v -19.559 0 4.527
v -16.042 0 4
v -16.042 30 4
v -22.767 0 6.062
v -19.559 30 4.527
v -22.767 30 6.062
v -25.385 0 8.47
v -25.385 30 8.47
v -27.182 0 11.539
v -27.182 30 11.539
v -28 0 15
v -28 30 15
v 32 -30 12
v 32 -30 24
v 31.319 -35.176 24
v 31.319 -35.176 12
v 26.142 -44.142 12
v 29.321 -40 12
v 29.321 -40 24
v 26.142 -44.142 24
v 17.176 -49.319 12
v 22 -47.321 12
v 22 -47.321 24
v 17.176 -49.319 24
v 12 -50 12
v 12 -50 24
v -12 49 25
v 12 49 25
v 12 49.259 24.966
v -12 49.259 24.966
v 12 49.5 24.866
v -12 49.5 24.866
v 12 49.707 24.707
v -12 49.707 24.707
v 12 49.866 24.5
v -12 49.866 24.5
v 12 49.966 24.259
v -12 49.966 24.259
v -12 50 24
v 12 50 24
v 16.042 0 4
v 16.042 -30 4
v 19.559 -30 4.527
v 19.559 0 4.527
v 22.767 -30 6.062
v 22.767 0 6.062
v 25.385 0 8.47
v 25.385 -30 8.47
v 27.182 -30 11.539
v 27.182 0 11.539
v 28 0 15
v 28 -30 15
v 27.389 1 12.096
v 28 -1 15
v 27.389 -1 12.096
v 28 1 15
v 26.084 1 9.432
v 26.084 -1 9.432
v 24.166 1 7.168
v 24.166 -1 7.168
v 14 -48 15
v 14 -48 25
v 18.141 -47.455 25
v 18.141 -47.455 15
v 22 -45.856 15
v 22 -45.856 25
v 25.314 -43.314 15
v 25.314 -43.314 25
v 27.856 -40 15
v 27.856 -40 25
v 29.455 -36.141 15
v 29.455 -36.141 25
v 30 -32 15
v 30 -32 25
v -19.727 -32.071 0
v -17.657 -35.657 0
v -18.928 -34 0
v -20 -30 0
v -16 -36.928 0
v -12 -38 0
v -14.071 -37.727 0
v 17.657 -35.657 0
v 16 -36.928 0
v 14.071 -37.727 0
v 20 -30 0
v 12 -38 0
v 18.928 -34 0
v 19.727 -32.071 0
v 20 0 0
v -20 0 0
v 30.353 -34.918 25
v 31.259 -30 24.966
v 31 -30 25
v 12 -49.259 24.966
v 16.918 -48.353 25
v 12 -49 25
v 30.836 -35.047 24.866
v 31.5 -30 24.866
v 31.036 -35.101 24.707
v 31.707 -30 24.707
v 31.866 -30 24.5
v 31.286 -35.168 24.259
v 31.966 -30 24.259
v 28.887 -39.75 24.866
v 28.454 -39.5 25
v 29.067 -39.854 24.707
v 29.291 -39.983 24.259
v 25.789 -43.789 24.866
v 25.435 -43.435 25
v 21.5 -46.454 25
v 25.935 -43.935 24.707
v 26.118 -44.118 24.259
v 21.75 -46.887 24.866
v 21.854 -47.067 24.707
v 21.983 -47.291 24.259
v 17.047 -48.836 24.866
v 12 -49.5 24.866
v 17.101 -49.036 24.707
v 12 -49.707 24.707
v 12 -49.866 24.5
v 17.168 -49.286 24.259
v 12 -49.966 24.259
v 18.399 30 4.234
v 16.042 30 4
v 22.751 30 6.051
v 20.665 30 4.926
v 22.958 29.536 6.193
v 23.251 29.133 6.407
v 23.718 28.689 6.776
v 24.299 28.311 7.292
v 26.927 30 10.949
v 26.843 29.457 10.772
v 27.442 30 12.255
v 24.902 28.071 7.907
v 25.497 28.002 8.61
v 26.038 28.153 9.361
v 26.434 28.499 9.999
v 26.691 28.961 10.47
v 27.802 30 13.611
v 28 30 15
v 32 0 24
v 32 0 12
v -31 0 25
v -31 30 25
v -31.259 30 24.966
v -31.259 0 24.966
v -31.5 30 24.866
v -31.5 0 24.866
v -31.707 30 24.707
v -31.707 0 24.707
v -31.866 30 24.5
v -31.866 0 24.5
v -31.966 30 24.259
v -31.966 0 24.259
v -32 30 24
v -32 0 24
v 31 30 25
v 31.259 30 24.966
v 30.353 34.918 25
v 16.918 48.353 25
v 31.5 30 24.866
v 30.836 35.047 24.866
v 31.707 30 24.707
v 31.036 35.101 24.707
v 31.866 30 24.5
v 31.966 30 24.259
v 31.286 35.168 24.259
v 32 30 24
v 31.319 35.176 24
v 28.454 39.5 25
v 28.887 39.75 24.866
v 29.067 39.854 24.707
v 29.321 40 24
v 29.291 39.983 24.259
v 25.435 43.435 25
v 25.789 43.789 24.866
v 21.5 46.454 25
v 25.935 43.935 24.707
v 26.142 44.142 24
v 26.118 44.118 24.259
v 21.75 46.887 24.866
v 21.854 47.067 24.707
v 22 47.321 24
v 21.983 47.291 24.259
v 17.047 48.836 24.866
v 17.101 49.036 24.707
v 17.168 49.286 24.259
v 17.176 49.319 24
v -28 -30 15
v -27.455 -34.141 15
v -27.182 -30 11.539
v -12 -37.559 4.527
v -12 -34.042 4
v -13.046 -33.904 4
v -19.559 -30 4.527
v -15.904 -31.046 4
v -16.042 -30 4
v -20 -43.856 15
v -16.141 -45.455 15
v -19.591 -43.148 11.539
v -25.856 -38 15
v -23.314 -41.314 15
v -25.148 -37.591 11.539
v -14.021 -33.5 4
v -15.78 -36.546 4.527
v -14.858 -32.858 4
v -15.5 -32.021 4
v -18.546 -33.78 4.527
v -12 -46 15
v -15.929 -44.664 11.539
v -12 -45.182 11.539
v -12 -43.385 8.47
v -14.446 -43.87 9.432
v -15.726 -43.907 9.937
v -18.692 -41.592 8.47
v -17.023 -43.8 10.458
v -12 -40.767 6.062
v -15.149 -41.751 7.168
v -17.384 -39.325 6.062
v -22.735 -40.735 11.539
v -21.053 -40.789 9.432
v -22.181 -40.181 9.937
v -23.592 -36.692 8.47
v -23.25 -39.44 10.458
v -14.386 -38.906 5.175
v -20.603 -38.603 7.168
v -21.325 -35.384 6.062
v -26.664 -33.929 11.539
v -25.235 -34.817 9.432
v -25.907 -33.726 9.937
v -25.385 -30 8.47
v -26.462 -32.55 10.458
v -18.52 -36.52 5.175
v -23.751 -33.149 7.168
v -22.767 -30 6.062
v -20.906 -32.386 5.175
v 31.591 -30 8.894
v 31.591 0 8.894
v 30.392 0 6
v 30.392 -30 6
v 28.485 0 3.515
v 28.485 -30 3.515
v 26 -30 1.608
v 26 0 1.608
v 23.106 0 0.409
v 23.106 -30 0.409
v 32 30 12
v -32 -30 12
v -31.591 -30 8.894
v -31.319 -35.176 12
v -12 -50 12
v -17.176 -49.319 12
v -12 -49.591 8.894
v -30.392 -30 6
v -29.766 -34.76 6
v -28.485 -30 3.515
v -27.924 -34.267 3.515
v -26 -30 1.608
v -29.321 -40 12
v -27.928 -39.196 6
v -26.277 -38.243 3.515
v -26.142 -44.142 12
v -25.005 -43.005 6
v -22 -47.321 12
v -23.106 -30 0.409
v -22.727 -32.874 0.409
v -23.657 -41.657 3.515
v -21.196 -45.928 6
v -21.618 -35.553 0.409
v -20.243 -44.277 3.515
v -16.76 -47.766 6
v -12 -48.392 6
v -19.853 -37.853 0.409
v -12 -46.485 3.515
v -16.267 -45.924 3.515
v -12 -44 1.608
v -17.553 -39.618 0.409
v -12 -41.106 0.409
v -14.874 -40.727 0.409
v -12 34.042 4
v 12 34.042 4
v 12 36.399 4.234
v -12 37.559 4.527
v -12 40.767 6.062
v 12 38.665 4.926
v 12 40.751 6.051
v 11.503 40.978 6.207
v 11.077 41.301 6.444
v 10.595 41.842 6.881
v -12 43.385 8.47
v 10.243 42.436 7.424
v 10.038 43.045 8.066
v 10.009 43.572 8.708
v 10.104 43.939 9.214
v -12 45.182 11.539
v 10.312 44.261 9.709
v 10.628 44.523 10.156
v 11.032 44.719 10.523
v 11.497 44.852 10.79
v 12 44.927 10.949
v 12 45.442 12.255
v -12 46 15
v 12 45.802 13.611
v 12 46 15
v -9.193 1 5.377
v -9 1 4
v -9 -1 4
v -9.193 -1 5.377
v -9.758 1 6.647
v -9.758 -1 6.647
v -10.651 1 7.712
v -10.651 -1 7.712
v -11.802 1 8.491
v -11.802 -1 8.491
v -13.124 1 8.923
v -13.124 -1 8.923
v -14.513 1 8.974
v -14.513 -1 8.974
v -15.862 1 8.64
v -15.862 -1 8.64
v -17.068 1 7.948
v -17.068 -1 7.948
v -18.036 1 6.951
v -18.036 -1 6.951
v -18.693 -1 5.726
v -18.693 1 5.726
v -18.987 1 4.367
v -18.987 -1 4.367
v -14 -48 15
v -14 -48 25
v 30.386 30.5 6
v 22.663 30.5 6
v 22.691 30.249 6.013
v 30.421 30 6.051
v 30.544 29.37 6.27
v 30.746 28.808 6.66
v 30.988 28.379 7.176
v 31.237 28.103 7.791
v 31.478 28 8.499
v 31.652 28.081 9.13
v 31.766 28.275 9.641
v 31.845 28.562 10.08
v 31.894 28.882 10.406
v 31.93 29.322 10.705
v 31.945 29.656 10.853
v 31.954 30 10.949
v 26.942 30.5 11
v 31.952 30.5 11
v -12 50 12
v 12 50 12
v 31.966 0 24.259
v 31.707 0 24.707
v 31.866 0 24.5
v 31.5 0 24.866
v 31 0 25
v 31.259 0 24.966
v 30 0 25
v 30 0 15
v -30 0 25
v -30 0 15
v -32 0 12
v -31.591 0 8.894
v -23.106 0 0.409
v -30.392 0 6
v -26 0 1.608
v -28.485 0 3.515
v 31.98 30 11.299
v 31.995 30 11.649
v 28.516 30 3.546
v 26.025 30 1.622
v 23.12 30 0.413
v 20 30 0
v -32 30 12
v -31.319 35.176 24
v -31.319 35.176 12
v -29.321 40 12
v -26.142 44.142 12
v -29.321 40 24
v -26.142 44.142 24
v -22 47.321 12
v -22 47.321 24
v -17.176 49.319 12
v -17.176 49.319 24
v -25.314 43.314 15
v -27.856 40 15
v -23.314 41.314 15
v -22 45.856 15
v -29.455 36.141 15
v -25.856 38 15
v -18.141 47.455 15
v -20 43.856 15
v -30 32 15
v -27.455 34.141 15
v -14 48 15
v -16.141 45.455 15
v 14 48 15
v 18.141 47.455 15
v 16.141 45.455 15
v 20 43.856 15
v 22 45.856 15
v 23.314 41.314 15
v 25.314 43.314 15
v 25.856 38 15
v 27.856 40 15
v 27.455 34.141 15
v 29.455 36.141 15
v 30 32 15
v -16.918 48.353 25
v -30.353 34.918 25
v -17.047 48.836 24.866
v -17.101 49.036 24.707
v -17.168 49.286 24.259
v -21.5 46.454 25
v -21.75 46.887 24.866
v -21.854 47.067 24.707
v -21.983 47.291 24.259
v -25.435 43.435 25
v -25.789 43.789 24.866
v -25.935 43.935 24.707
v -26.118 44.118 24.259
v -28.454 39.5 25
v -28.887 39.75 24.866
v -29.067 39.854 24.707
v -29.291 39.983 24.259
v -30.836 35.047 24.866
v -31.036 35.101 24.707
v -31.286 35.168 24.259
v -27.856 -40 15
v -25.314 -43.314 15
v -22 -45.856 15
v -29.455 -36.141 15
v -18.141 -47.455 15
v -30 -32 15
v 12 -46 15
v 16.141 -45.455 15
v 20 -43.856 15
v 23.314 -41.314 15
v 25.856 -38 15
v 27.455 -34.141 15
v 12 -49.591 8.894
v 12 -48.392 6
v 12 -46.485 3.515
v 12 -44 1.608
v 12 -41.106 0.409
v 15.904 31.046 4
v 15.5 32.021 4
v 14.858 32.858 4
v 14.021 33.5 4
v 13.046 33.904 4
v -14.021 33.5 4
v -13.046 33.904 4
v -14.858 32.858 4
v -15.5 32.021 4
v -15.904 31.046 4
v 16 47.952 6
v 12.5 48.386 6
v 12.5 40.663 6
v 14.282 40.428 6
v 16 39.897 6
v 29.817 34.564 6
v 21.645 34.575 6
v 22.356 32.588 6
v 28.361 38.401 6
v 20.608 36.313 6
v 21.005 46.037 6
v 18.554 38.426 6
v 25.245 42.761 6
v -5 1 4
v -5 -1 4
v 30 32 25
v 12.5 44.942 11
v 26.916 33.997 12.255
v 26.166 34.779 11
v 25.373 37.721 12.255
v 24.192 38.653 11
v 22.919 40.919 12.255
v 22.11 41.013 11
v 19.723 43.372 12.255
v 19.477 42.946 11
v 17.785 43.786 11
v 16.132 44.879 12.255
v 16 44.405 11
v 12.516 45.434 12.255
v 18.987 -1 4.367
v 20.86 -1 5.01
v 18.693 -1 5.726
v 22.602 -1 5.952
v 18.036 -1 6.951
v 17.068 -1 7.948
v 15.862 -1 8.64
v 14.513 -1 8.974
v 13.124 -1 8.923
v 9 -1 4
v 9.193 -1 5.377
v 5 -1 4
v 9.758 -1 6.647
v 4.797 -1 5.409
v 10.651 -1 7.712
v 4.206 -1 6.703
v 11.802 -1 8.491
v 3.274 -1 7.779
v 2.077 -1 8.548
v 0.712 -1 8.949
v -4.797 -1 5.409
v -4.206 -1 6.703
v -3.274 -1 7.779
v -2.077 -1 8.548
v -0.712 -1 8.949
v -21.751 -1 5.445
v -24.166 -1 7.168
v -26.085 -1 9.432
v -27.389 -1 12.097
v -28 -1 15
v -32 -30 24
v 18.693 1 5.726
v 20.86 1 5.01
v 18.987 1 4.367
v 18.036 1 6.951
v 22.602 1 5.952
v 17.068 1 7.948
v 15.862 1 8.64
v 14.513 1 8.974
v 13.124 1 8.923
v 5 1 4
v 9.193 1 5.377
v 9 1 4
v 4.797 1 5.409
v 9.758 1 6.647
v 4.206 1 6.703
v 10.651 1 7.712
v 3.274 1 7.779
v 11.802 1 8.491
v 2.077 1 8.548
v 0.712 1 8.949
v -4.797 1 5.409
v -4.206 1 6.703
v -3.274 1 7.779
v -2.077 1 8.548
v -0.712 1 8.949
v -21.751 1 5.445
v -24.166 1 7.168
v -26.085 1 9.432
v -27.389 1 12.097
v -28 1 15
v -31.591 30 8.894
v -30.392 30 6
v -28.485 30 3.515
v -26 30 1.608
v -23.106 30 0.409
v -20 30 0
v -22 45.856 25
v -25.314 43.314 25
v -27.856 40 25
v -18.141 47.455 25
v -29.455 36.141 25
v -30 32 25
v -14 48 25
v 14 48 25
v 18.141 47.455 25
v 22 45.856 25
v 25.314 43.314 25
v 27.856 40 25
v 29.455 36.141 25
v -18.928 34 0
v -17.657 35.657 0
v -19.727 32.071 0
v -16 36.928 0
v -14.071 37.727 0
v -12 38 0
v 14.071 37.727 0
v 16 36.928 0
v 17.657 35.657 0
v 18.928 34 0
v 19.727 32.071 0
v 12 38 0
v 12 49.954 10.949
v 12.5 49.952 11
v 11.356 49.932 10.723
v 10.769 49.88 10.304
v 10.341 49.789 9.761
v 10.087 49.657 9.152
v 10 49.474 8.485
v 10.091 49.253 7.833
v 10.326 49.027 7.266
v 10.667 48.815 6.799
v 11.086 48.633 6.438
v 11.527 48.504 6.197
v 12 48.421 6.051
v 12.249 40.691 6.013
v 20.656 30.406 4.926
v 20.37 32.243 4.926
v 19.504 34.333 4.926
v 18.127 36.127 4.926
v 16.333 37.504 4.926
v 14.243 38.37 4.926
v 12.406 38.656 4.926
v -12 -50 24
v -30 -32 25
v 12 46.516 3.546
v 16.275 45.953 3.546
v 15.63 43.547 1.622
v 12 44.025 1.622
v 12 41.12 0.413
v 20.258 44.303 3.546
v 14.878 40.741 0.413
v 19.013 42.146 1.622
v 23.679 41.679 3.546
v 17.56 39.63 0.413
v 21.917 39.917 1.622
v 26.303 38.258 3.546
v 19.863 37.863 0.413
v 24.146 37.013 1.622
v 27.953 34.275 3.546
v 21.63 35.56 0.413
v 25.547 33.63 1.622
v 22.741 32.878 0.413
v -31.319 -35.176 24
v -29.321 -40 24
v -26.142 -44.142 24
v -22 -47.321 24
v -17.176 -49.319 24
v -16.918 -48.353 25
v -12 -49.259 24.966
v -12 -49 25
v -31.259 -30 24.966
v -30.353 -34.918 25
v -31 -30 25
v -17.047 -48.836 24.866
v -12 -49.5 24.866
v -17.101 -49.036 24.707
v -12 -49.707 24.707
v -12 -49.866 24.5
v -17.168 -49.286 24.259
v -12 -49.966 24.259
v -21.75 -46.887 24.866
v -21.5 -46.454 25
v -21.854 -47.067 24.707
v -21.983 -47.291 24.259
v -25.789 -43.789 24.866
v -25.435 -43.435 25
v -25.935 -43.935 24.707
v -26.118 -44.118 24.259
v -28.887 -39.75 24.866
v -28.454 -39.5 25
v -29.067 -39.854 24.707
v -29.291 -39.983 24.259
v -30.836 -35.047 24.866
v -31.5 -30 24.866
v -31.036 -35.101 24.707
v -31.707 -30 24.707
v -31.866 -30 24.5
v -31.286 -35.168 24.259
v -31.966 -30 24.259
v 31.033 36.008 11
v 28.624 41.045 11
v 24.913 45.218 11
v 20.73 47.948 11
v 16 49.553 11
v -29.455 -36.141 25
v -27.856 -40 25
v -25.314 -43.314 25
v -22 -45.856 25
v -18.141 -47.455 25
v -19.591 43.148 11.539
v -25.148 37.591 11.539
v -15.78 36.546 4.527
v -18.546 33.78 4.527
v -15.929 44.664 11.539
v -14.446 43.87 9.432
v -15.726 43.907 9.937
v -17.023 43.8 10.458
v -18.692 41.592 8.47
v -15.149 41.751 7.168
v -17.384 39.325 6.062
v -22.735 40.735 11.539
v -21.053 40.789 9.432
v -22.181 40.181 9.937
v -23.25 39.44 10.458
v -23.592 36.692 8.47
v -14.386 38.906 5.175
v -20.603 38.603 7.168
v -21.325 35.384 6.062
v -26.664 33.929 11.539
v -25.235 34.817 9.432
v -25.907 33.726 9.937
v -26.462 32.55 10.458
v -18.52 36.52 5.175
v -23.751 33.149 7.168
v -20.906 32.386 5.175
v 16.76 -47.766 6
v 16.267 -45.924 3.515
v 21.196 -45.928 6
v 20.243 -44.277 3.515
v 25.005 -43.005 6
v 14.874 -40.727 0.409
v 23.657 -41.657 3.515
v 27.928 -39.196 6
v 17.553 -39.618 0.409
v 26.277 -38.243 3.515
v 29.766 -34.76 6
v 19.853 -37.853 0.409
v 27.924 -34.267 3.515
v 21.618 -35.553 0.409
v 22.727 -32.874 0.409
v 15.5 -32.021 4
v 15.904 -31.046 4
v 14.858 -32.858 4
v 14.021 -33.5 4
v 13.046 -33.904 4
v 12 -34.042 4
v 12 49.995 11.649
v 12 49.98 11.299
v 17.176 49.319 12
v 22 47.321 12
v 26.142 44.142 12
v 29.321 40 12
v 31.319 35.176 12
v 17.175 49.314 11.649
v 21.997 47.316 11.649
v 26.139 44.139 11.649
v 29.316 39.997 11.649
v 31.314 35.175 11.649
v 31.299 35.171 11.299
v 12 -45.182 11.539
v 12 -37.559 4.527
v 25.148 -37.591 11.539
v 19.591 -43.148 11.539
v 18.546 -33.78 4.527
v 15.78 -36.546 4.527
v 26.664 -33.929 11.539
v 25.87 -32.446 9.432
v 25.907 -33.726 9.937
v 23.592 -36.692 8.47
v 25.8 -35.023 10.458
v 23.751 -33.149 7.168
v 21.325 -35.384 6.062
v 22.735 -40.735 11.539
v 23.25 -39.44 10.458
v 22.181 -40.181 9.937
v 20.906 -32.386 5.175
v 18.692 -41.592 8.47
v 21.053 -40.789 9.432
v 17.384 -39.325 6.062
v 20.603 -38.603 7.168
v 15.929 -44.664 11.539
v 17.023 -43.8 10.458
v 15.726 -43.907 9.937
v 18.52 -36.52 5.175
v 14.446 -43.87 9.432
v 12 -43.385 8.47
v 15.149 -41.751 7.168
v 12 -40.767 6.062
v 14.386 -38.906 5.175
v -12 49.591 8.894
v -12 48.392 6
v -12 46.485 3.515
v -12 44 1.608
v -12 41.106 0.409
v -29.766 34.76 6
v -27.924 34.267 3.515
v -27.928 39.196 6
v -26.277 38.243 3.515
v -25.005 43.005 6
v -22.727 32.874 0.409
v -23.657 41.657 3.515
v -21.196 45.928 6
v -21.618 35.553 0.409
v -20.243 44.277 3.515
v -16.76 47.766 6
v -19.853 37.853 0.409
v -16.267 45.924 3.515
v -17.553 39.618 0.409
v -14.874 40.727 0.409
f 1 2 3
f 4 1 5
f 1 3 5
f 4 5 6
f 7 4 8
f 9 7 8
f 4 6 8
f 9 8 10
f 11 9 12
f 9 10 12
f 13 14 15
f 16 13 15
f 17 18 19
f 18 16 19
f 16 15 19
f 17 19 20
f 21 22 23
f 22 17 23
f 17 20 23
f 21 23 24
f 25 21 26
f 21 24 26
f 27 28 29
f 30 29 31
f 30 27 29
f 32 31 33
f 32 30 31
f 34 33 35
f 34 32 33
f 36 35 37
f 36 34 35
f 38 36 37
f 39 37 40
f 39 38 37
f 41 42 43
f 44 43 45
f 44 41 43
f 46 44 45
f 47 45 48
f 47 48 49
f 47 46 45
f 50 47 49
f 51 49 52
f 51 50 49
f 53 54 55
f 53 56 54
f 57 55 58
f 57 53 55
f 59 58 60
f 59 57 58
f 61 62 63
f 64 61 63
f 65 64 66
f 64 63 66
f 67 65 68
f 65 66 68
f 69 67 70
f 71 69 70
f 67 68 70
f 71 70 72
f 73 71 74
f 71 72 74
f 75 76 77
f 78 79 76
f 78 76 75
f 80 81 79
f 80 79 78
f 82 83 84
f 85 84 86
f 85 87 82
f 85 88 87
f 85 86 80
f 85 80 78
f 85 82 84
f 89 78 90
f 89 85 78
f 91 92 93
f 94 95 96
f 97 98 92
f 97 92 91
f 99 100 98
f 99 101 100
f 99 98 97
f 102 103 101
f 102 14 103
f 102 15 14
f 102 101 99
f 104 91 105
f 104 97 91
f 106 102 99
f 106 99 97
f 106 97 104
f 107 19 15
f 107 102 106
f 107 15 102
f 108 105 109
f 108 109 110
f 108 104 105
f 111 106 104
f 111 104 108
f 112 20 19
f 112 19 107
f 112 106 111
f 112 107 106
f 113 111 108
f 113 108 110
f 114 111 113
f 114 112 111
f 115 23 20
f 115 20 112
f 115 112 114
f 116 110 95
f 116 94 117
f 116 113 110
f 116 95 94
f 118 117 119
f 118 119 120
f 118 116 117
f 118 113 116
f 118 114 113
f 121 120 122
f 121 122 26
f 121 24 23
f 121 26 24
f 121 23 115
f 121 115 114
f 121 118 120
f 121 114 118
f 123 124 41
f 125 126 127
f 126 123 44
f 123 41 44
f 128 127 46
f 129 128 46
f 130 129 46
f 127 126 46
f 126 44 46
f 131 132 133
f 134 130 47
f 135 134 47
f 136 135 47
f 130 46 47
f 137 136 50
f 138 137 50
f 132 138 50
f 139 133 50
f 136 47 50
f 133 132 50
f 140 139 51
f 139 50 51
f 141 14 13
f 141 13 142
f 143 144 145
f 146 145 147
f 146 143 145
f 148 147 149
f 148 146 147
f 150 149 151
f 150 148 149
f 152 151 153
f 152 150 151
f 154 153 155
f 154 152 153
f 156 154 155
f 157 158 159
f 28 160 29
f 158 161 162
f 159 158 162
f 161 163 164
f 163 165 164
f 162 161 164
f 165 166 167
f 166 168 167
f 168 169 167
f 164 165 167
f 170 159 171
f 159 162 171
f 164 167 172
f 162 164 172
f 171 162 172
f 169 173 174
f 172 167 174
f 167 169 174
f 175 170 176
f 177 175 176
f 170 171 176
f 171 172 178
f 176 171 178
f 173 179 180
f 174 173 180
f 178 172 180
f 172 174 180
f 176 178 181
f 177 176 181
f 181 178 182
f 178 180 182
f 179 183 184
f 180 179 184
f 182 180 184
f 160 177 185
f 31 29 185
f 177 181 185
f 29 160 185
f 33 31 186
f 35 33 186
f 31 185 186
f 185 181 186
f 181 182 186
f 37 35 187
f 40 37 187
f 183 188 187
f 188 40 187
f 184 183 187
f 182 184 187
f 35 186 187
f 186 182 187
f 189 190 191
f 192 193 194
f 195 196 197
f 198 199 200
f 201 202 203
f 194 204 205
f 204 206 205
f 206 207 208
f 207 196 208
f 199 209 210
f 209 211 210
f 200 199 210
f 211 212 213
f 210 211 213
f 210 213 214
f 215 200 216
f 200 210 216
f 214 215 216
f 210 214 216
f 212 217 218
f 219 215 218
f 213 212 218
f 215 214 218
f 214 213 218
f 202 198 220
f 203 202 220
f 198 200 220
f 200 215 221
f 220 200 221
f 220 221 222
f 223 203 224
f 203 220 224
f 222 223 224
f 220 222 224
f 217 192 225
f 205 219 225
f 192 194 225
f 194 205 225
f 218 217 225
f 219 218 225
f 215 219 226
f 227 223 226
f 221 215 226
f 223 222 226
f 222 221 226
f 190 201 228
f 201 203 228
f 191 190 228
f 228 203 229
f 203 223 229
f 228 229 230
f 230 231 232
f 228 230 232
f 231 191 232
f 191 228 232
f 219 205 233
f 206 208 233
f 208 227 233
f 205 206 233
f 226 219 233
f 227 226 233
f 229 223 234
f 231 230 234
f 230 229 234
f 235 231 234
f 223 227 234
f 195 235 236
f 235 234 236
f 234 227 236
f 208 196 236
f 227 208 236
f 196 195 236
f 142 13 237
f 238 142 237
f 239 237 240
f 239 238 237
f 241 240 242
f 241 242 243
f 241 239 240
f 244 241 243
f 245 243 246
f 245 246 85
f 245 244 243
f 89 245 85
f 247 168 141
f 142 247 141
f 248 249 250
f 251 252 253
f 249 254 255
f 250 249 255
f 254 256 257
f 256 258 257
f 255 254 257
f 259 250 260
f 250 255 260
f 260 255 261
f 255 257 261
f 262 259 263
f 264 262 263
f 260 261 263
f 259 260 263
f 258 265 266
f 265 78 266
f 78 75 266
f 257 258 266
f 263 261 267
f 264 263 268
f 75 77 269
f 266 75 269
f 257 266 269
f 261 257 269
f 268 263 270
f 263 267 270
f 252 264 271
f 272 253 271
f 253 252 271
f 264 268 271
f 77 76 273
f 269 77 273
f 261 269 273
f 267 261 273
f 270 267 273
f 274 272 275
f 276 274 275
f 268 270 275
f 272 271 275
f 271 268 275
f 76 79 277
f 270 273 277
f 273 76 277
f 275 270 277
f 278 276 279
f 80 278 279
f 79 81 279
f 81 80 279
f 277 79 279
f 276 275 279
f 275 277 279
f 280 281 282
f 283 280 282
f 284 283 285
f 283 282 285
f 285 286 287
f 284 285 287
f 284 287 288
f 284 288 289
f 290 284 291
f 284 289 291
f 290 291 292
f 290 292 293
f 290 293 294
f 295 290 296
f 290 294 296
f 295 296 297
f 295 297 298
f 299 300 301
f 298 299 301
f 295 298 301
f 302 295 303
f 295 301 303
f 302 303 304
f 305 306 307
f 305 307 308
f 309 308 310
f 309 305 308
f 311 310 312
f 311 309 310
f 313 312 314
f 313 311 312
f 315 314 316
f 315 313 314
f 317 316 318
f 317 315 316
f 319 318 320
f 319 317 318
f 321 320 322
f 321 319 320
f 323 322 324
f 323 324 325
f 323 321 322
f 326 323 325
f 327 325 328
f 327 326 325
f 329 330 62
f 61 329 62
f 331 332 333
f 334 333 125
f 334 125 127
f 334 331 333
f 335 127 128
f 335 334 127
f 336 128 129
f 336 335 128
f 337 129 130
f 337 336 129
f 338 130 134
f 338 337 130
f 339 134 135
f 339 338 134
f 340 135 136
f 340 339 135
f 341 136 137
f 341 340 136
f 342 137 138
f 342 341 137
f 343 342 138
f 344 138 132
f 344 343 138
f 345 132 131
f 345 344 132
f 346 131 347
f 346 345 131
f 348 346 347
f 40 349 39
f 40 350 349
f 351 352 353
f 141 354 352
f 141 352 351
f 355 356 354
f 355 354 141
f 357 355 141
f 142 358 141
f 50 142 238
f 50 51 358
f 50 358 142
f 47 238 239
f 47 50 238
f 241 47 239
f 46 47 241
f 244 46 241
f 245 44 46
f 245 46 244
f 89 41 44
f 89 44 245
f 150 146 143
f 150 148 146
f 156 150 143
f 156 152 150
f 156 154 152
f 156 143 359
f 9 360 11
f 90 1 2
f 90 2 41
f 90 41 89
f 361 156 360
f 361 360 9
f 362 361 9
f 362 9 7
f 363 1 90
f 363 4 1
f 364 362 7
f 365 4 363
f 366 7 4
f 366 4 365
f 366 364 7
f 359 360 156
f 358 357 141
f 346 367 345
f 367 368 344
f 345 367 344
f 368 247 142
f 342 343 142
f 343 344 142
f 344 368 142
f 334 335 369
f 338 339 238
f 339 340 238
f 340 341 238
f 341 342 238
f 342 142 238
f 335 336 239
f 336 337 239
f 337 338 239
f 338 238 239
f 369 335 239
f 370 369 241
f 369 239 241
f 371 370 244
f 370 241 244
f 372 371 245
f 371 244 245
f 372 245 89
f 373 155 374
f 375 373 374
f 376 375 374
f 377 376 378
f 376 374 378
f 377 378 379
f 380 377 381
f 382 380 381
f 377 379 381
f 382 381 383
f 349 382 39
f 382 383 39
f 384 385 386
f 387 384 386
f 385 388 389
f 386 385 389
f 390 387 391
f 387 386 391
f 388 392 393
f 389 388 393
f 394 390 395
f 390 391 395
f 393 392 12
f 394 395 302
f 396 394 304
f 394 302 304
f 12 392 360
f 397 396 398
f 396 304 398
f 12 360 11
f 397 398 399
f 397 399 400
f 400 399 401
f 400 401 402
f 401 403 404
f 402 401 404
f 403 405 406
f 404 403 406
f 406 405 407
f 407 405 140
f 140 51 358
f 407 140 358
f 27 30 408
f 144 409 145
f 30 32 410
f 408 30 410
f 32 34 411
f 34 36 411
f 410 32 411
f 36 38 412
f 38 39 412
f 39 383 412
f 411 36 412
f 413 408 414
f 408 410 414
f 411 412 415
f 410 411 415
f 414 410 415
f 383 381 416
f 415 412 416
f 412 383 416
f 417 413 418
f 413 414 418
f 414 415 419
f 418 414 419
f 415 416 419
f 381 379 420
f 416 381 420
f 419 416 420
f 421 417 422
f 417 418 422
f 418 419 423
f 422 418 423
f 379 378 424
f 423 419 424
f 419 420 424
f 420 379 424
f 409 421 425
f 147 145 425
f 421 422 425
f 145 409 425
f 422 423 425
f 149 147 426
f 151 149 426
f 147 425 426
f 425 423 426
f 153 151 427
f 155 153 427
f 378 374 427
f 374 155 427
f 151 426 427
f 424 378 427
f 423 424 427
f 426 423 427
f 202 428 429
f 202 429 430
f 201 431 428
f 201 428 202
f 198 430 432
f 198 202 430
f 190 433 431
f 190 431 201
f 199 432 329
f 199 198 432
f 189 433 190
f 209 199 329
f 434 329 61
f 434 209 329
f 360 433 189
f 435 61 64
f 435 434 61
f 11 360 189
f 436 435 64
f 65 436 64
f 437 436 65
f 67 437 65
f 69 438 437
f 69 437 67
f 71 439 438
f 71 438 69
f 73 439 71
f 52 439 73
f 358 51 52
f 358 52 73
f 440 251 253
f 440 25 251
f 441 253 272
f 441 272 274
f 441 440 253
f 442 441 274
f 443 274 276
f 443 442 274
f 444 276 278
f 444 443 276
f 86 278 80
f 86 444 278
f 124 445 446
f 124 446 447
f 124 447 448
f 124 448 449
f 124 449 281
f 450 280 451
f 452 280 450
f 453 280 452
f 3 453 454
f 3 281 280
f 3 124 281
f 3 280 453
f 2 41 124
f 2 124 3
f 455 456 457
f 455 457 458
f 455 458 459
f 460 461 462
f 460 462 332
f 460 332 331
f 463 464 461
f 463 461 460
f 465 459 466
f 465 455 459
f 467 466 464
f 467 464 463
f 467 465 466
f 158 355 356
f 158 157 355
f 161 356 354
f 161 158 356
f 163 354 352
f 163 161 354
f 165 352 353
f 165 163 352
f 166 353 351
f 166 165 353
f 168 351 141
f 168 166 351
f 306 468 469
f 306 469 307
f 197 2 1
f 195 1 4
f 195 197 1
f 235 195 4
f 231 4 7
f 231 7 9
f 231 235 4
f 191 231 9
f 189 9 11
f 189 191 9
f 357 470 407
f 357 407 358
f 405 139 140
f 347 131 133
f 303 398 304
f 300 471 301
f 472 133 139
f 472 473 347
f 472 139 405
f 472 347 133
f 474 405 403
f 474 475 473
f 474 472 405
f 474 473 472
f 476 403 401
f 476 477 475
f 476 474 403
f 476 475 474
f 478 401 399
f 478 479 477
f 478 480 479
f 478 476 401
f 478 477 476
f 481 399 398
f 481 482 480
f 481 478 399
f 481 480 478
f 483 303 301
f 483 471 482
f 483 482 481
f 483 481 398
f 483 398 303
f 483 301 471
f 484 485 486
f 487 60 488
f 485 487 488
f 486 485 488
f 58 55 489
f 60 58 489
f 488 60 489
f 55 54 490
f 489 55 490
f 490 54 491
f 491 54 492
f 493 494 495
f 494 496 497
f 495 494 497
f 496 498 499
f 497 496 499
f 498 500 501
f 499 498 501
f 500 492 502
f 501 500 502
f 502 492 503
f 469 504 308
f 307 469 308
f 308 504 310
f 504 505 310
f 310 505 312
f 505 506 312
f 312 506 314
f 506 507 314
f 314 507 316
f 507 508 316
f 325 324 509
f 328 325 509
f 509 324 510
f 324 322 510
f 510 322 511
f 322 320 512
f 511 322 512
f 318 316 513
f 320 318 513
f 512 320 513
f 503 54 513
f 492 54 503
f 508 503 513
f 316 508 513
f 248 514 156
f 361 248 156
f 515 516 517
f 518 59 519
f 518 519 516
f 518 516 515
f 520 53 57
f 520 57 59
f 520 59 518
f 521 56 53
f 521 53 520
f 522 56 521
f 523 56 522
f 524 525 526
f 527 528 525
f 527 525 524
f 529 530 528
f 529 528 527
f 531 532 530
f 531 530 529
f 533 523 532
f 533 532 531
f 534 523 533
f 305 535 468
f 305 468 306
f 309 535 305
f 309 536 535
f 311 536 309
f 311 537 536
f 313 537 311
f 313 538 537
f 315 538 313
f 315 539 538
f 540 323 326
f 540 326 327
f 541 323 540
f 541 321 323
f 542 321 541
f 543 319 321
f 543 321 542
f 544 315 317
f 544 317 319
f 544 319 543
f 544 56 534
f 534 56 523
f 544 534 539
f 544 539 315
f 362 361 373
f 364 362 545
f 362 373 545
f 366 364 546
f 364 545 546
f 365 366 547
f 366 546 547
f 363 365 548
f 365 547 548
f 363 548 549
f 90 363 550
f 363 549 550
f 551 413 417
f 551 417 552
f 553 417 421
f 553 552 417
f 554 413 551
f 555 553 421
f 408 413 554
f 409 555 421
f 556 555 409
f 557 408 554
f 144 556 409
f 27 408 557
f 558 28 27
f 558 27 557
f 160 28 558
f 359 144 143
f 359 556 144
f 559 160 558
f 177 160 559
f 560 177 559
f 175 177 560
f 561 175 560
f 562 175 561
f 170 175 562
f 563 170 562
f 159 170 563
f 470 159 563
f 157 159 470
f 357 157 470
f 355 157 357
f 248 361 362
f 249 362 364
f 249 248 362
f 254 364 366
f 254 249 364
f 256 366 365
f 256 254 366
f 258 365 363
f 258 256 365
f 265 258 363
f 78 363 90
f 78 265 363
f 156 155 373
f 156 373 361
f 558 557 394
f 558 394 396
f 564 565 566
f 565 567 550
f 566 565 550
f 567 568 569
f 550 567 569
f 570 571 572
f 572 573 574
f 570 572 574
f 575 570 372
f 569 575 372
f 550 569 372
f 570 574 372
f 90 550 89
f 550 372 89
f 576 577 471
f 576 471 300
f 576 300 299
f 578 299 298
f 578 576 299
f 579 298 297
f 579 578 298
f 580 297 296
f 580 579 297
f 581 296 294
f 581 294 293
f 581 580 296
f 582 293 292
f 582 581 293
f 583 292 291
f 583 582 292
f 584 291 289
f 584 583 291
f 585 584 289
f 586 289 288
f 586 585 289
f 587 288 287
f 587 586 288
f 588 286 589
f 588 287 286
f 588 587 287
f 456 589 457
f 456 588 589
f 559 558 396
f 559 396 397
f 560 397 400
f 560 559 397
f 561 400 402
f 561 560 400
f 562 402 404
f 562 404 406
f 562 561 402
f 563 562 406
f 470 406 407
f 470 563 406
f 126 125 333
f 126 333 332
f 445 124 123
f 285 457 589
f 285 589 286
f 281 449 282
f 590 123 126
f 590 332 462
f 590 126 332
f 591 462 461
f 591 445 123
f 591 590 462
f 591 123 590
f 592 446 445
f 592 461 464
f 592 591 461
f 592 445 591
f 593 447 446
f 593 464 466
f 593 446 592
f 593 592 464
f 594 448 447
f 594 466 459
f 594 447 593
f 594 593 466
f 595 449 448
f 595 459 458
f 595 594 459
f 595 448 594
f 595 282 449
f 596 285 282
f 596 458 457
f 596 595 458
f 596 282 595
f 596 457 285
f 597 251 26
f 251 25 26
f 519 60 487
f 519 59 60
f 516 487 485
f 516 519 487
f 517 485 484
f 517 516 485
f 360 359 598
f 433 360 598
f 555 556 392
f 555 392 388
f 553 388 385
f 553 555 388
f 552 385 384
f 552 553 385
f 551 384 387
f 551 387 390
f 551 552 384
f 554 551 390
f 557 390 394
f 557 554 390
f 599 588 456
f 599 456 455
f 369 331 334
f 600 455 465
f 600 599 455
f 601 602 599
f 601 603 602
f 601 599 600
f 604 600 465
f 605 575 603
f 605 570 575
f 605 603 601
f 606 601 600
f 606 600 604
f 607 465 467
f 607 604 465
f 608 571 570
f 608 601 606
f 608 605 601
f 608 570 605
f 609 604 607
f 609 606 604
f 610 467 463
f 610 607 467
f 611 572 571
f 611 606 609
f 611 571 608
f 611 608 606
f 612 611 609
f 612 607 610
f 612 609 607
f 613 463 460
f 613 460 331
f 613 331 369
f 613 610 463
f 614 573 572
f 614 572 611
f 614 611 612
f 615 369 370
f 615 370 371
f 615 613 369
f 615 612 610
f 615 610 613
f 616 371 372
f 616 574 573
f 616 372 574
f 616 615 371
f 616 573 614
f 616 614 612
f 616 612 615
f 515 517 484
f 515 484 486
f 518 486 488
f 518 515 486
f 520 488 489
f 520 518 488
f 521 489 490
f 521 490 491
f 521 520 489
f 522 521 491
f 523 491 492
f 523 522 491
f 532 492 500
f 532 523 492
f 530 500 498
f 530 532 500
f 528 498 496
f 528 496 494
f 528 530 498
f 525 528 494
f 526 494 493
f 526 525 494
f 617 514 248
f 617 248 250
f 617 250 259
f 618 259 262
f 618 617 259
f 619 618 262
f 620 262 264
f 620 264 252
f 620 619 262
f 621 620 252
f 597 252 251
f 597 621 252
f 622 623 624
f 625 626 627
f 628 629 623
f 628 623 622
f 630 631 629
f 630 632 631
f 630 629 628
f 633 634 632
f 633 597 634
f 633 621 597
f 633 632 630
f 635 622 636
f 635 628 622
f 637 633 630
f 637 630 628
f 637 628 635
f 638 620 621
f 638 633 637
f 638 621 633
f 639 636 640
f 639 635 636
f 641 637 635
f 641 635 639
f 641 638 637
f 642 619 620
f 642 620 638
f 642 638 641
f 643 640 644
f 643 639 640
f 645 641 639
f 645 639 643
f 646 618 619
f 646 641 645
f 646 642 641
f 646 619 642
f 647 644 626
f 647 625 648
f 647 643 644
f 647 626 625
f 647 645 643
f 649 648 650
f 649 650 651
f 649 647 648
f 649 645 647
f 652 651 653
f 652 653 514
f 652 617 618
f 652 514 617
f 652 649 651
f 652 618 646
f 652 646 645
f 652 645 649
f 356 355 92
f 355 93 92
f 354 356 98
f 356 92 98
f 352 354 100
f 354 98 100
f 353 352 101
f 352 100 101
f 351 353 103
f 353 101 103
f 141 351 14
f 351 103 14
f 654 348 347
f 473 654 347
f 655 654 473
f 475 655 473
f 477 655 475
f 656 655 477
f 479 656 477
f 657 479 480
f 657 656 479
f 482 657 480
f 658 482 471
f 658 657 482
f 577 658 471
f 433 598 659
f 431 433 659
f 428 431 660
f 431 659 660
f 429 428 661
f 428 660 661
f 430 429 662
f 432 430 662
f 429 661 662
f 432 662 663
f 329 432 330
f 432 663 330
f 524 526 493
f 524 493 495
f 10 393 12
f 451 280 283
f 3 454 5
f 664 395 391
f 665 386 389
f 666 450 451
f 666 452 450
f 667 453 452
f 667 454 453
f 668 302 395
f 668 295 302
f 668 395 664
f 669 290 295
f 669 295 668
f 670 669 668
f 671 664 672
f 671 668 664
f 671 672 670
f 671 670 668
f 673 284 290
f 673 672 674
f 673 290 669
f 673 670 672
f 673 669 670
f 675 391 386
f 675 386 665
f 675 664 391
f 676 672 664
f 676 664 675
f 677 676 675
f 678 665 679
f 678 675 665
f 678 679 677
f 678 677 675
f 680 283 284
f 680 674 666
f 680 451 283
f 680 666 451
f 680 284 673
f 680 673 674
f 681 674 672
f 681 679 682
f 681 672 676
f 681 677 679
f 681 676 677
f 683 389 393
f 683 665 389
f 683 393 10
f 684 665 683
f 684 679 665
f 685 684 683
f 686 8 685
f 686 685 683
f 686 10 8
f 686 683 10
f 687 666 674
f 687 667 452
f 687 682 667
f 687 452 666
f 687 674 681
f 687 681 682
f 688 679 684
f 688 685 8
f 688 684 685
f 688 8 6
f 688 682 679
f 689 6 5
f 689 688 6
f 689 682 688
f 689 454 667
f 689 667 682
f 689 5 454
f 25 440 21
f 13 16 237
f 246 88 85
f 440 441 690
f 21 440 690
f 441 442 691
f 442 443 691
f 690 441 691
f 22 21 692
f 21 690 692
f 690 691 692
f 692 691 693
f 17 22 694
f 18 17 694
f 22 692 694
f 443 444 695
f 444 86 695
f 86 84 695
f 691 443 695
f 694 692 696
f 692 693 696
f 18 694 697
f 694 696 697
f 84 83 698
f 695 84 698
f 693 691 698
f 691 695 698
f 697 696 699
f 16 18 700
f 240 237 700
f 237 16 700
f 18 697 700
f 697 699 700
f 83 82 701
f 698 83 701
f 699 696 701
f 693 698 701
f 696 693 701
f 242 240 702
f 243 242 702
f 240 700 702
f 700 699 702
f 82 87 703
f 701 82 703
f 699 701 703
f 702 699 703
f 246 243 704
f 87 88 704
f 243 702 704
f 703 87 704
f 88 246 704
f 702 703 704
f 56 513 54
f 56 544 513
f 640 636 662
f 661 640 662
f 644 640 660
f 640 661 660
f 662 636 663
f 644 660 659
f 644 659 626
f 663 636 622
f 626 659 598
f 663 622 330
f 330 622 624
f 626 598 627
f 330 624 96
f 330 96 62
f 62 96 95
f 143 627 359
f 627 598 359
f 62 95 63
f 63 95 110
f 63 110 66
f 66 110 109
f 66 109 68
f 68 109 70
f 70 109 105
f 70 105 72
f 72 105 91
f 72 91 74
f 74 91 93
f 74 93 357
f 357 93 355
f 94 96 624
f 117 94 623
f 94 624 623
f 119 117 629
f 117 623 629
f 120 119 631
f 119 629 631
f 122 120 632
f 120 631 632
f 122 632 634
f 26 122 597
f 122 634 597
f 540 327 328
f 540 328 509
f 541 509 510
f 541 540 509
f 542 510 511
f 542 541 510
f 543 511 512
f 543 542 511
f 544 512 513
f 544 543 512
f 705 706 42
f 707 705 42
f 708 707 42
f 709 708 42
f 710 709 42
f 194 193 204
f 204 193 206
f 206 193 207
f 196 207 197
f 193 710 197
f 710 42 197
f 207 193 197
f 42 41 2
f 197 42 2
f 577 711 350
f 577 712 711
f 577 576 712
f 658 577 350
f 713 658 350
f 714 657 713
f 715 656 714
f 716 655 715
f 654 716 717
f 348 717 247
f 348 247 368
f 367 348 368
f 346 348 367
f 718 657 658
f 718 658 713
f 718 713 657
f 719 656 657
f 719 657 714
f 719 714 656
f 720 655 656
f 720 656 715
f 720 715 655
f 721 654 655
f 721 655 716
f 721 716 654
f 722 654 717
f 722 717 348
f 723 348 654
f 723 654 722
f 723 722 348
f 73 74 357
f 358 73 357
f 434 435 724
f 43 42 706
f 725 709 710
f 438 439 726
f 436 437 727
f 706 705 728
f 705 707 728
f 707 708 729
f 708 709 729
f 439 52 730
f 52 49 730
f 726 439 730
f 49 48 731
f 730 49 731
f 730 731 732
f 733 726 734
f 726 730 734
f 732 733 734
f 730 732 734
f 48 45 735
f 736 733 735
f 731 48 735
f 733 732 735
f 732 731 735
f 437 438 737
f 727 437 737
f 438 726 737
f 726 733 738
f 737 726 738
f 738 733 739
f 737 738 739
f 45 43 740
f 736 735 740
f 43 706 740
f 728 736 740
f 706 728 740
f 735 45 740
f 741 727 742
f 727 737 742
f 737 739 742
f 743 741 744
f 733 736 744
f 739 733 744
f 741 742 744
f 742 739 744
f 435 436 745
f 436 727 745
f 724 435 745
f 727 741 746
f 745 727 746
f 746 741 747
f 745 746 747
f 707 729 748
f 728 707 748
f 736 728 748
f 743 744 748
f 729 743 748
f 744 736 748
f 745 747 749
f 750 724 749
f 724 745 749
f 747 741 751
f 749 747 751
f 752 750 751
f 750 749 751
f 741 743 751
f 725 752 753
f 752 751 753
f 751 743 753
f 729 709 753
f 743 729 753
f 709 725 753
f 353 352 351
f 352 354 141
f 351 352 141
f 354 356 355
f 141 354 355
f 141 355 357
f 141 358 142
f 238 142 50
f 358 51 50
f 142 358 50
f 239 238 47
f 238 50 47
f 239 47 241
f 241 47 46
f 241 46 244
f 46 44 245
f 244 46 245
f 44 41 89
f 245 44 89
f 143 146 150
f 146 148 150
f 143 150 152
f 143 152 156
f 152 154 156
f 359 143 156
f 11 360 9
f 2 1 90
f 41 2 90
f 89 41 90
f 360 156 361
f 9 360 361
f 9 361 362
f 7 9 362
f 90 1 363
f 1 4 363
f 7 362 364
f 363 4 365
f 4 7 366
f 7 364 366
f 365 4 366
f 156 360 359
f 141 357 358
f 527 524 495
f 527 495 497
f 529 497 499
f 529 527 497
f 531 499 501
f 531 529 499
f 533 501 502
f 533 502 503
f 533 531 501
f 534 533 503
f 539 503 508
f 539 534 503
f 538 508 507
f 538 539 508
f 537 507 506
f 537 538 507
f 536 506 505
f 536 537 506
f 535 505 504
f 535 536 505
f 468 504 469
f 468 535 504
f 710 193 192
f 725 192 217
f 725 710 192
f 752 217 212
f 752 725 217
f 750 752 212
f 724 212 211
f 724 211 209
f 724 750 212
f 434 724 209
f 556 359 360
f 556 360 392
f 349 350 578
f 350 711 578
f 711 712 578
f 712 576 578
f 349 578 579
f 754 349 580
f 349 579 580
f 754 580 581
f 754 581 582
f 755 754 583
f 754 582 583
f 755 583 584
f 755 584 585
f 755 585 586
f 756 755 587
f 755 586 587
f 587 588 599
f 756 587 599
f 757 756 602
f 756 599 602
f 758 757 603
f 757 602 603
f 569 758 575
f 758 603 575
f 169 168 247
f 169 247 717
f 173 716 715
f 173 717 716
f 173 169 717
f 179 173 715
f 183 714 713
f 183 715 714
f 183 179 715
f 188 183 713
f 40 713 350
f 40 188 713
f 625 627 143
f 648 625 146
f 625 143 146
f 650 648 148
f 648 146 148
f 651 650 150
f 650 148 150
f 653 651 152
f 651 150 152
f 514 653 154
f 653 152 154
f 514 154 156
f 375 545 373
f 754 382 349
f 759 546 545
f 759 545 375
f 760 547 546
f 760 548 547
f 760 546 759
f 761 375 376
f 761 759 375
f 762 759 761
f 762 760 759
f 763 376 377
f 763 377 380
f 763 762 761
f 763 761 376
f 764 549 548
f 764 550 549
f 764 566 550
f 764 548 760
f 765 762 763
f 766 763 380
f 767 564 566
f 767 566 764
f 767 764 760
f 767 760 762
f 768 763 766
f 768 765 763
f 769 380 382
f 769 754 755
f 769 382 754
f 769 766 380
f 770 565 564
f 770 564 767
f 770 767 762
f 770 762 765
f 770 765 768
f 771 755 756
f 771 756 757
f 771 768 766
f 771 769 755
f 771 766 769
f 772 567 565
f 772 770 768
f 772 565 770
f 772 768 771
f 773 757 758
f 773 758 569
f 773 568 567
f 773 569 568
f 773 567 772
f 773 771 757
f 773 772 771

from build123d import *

# Parameters (mm, degrees)
SKETCH2_W           = 100
SKETCH2_H           = 25
BOSS_EXTRUDE3_DEPTH = 32
CUT_EXTRUDE1_DEPTH  = 10
CUT_EXTRUDE2_DEPTH  = 11
FILLET1_R           = 12
FILLET2_R           = 20
FILLET3_R           = 12
FILLET13_R          = 1
BOSS_EXTRUDE4_DEPTH = 1
CUT_EXTRUDE3_DEPTH  = 16
CUT_EXTRUDE4_DEPTH  = 16


with BuildPart() as part:
    # Sketch2 → Boss-Extrude3 (new, symmetric)
    with BuildSketch(Plane.YZ):
        with Locations((0, 12.5)):
            Rectangle(SKETCH2_W, SKETCH2_H)
    extrude(amount=BOSS_EXTRUDE3_DEPTH, both=True)

    # Sketch3 → Cut-Extrude1 (cut)
    with BuildSketch(Plane.XY.offset(25)):
        with BuildLine():
            Line((-30, 0), (-30, -32))
            ThreePointArc((-30, -32), (-25.313708499, -43.313708499), (-14, -48))
            Line((-14, -48), (14, -48))
            ThreePointArc((14, -48), (25.313708499, -43.313708499), (30, -32))
            Line((30, -32), (30, 0))
            Line((30, 0), (-30, 0))
        make_face()
    extrude(amount=-CUT_EXTRUDE1_DEPTH, mode=Mode.SUBTRACT)

    # Sketch4 → Cut-Extrude2 (cut)
    with BuildSketch(Plane.XY.offset(15)):
        with BuildLine():
            Line((-28, 0), (28, 0))
            Line((28, 0), (28, -30))
            ThreePointArc((28, -30), (23.313708499, -41.313708499), (12, -46))
            Line((12, -46), (-12, -46))
            ThreePointArc((-12, -46), (-23.313708499, -41.313708499), (-28, -30))
            Line((-28, -30), (-28, 0))
        make_face()
    extrude(amount=-CUT_EXTRUDE2_DEPTH, mode=Mode.SUBTRACT)

    # SurfaceCut2
    split(bisect_by=Plane(origin=(0, 0, 0), x_dir=(-1, 0, 0), z_dir=(0, 1, 0)), keep=Keep.BOTTOM)

    # Fillet1
    # the kernel refuses this fillet: 12 mm, written as the material it adds along each edge
    with BuildSketch(Plane(origin=(-28, -30, 4), x_dir=(1, 0, 0), z_dir=(0, 1, 0))) as fillet1_piece_1:
        with BuildLine():
            CenterArc((11.958260743, -12), FILLET1_R, 90, 85.219808153)
            Line((0, -11), (-0.239165215, -10.98))
            ThreePointArc((-0.239165215, -10.98), (-0.24, -5.5), (-0.24, 0))
            Line((-0.24, 0), (0, 0.24))
            Line((0, 0.24), (11.958260743, 0.24))
            Line((11.958260743, 0.24), (11.958260743, 0))
        make_face()
    extrude(amount=30)
    with BuildSketch(Plane(origin=(28, 0, 4), x_dir=(0, 0, 1), z_dir=(0, -1, 0))) as fillet1_piece_2:
        with BuildLine():
            CenterArc((12, 11.958260743), FILLET1_R, 180, 85.219808153)
            Line((0, 11.958260743), (-0.24, 11.958260743))
            Line((-0.24, 11.958260743), (-0.24, 0))
            Line((-0.24, 0), (0, -0.24))
            ThreePointArc((0, -0.24), (5.5, -0.24), (10.98, -0.239165215))
            Line((10.98, -0.239165215), (11, 0))
        make_face()
    extrude(amount=30)
    with BuildSketch(Plane(origin=(12, -30, 4), x_dir=(1, 0, 0), z_dir=(0, 1, 0))) as fillet1_piece_3:
        with BuildLine():
            CenterArc((4.041739257, -12), FILLET1_R, 4.780191847, 85.219808153)
            Line((16, -11), (16.239165215, -10.98))
            ThreePointArc((16.239165215, -10.98), (16.24, -5.5), (16.24, 0))
            Line((16.24, 0), (16, 0.24))
            Line((16, 0.24), (4.041739257, 0.24))
            Line((4.041739257, 0.24), (4.041739257, 0))
        make_face()
    revolve(axis=Axis((12, -30, 4), (0, 0, -1)), revolution_arc=90)
    with BuildSketch(Plane(origin=(12, -46, 4), x_dir=(0, 1, 0), z_dir=(-1, 0, 0))) as fillet1_piece_4:
        with BuildLine():
            CenterArc((11.958260743, -12), FILLET1_R, 90, 85.219808153)
            Line((0, -11), (-0.239165215, -10.98))
            ThreePointArc((-0.239165215, -10.98), (-0.24, -5.5), (-0.24, 0))
            Line((-0.24, 0), (0, 0.24))
            Line((0, 0.24), (11.958260743, 0.24))
            Line((11.958260743, 0.24), (11.958260743, 0))
        make_face()
    extrude(amount=24)
    with BuildSketch(Plane(origin=(-12, -30, 4), x_dir=(0, -1, 0), z_dir=(1, 0, 0))) as fillet1_piece_5:
        with BuildLine():
            CenterArc((4.041739257, -12), FILLET1_R, 4.780191847, 85.219808153)
            Line((16, -11), (16.239165215, -10.98))
            ThreePointArc((16.239165215, -10.98), (16.24, -5.5), (16.24, 0))
            Line((16.24, 0), (16, 0.24))
            Line((16, 0.24), (4.041739257, 0.24))
            Line((4.041739257, 0.24), (4.041739257, 0))
        make_face()
    revolve(axis=Axis((-12, -30, 4), (0, 0, -1)), revolution_arc=90)

    # Fillet2
    fillet2_edges = [part.edges().sort_by_distance(p)[0] for p in [
        (32, -50, 12.5),
        (-32, -50, 12.5),
    ]]
    fillet(fillet2_edges, radius=FILLET2_R)

    # Fillet3
    fillet3_edges = [part.edges().sort_by_distance(p)[0] for p in [
        (0, -50, 0),
        (32, -15, 0),
        (-32, -15, 0),
        (26.142135624, -44.142135624, 0),
        (-26.142135624, -44.142135624, 0),
    ]]
    fillet(fillet3_edges, radius=FILLET3_R)

    # Fillet13
    fillet13_edges = [part.edges().sort_by_distance(p)[0] for p in [
        (-32, -15, 25),
        (32, -15, 25),
        (0, -50, 25),
        (26.142135624, -44.142135624, 25),
        (-26.142135624, -44.142135624, 25),
    ]]
    fillet(fillet13_edges, radius=FILLET13_R)


with BuildPart() as body_2:
    # Sketch7 → Boss-Extrude4 (new, symmetric)
    with BuildSketch(Plane(origin=(0, 0, 0), x_dir=(-1, 0, 0), z_dir=(0, 1, 0))):
        with BuildLine():
            ThreePointArc((-24.165777662, 7.168239134), (-21.750636592, 5.444977915), (-18.986517938, 4.366931681))
            ThreePointArc((-18.986517938, 4.366931681), (-13.81641036, 8.996628348), (-9, 4))
            Line((-9, 4), (-5, 4))
            ThreePointArc((-5, 4), (0, 9), (5, 4))
            Line((5, 4), (9, 4))
            ThreePointArc((9, 4), (13.81641036, 8.996628348), (18.986517938, 4.366931681))
            ThreePointArc((18.986517938, 4.366931681), (25.195464263, 8.240533619), (28, 15))
            Line((28, 15), (-28, 15))
            ThreePointArc((-28, 15), (-26.819438656, 10.723524314), (-24.165777662, 7.168239134))
        make_face()
    extrude(amount=BOSS_EXTRUDE4_DEPTH, both=True)


with BuildPart() as body_3:
    # Mirror2: read off the stored shape, not the designer's step
    # Mirror2: mirrored copy
    add(part.part.mirror(Plane(origin=(0, 0, 0), x_dir=(1, 0, 0), z_dir=(0, 1, 0))))

    # Sketch9 → Cut-Extrude3 (cut)
    with BuildSketch(Plane.YZ.offset(32)):
        with BuildLine():
            Line((30.5, 11), (54.187598308, 11))
            ThreePointArc((54.187598308, 11), (56.687598308, 8.5), (54.187598308, 6))
            Line((54.187598308, 6), (30.5, 6))
            ThreePointArc((30.5, 6), (28, 8.5), (30.5, 11))
        make_face()
    extrude(amount=-CUT_EXTRUDE3_DEPTH, mode=Mode.SUBTRACT)

    # Sketch10 → Cut-Extrude4 (cut)
    with BuildSketch(Plane(origin=(0, 50, 0), x_dir=(-1, 0, 0), z_dir=(0, 1, 0))):
        with BuildLine():
            Line((-30.093221435, 11), (-12.5, 11))
            ThreePointArc((-12.5, 11), (-10, 8.5), (-12.5, 6))
            Line((-12.5, 6), (-30.093221435, 6))
            ThreePointArc((-30.093221435, 6), (-32.593221435, 8.5), (-30.093221435, 11))
        make_face()
    extrude(amount=-CUT_EXTRUDE4_DEPTH, mode=Mode.SUBTRACT)


solid = Compound([part.part, body_2.part, body_3.part])
